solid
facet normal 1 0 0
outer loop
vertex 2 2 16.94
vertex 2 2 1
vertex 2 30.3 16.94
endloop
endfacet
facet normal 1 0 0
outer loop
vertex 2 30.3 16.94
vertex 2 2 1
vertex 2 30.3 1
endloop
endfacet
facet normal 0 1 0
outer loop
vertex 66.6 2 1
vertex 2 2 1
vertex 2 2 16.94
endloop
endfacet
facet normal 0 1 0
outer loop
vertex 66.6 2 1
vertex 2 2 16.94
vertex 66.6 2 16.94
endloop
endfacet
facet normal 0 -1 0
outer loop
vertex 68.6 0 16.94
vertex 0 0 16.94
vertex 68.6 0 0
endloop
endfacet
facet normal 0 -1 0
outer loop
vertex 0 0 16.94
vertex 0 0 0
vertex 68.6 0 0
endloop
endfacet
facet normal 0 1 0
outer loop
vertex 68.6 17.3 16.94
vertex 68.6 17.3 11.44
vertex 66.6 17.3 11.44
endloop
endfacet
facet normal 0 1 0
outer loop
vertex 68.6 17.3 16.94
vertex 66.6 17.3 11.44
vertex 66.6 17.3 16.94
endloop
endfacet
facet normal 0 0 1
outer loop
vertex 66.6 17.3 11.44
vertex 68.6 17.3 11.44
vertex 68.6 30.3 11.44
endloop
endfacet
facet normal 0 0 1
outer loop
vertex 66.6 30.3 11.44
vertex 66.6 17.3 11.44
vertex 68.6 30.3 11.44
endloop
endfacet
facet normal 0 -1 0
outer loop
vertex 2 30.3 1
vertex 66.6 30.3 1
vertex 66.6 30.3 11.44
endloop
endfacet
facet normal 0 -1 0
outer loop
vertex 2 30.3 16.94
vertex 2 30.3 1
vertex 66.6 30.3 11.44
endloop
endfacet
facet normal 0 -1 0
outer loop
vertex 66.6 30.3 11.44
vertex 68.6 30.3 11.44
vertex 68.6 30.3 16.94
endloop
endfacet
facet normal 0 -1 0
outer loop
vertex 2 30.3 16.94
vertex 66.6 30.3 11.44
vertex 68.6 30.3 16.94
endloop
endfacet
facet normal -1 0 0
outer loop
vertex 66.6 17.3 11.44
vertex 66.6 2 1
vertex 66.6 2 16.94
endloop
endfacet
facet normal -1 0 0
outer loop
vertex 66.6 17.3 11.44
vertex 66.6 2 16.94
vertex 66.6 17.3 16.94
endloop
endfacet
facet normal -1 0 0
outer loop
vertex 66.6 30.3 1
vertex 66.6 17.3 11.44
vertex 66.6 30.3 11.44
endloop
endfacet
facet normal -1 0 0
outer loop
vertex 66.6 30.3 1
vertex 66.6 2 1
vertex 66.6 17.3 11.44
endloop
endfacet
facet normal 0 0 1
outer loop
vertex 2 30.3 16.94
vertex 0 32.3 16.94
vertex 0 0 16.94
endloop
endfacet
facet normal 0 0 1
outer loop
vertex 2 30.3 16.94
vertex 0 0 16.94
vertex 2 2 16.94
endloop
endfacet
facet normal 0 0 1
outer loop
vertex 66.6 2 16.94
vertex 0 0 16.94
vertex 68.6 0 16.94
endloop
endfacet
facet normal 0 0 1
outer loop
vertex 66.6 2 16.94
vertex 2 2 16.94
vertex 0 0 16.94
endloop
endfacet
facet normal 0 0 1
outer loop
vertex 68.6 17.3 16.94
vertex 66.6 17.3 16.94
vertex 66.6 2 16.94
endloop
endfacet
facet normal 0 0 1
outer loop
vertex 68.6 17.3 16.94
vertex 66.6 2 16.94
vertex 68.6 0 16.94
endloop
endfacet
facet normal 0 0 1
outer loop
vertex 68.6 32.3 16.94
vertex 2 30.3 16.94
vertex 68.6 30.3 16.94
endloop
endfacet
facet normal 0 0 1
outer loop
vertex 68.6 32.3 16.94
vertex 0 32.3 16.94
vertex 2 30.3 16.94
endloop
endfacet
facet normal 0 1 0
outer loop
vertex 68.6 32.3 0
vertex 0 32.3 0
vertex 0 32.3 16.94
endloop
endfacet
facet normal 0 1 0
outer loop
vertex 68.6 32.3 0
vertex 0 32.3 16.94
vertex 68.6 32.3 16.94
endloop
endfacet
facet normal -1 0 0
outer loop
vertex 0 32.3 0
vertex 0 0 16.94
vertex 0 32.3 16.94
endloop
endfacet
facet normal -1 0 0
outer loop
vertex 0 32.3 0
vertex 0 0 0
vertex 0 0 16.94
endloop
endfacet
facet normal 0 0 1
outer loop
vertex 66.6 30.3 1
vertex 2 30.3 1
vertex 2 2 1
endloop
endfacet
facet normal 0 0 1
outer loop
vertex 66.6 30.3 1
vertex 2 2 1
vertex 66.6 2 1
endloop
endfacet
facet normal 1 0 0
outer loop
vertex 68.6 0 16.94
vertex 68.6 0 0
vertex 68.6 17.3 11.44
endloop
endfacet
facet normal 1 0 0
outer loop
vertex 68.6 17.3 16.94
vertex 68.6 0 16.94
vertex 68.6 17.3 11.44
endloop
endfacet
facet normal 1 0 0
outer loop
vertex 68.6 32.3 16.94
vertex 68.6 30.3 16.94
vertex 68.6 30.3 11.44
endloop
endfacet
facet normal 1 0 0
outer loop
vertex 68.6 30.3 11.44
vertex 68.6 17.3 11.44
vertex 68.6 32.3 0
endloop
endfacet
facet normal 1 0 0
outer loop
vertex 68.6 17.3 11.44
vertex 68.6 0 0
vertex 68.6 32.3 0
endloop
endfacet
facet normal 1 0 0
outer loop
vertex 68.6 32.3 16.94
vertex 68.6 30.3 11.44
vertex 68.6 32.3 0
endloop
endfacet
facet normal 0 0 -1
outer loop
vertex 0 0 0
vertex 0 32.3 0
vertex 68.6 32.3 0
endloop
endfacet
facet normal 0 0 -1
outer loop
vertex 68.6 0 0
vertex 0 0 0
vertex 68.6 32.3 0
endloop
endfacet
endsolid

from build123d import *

# Parameters (mm, degrees)
F0_W     = 68.6
F0_H     = 32.3
F1_DEPTH = 1
F2_W     = 68.6
F2_H     = 32.3
F2_W_2   = 64.6
F2_H_2   = 28.3
F3_DEPTH = 15.94
F4_W     = 13
F4_H     = 5.5
F5_DEPTH = 25


with BuildPart() as f1:
    # F0 (on Top) → F1 (new body)
    with BuildSketch(Plane.XY):
        with Locations((34.3, 16.15)):
            Rectangle(F0_W, F0_H)
    extrude(amount=F1_DEPTH)

    # F2 (on face) → F3 (join)
    with BuildSketch(Plane.XY.offset(1)):
        with Locations((34.3, 16.15)):
            Rectangle(F2_W, F2_H)
        with Locations((34.3, 16.15)):
            Rectangle(F2_W_2, F2_H_2, mode=Mode.SUBTRACT)
    extrude(amount=F3_DEPTH)

    # F4 (on face) → F5 (cut)
    with BuildSketch(Plane.YZ.offset(68.6)):
        with Locations((23.8, 14.19)):
            Rectangle(F4_W, F4_H)
    extrude(amount=-F5_DEPTH, mode=Mode.SUBTRACT)


solid = f1.part
